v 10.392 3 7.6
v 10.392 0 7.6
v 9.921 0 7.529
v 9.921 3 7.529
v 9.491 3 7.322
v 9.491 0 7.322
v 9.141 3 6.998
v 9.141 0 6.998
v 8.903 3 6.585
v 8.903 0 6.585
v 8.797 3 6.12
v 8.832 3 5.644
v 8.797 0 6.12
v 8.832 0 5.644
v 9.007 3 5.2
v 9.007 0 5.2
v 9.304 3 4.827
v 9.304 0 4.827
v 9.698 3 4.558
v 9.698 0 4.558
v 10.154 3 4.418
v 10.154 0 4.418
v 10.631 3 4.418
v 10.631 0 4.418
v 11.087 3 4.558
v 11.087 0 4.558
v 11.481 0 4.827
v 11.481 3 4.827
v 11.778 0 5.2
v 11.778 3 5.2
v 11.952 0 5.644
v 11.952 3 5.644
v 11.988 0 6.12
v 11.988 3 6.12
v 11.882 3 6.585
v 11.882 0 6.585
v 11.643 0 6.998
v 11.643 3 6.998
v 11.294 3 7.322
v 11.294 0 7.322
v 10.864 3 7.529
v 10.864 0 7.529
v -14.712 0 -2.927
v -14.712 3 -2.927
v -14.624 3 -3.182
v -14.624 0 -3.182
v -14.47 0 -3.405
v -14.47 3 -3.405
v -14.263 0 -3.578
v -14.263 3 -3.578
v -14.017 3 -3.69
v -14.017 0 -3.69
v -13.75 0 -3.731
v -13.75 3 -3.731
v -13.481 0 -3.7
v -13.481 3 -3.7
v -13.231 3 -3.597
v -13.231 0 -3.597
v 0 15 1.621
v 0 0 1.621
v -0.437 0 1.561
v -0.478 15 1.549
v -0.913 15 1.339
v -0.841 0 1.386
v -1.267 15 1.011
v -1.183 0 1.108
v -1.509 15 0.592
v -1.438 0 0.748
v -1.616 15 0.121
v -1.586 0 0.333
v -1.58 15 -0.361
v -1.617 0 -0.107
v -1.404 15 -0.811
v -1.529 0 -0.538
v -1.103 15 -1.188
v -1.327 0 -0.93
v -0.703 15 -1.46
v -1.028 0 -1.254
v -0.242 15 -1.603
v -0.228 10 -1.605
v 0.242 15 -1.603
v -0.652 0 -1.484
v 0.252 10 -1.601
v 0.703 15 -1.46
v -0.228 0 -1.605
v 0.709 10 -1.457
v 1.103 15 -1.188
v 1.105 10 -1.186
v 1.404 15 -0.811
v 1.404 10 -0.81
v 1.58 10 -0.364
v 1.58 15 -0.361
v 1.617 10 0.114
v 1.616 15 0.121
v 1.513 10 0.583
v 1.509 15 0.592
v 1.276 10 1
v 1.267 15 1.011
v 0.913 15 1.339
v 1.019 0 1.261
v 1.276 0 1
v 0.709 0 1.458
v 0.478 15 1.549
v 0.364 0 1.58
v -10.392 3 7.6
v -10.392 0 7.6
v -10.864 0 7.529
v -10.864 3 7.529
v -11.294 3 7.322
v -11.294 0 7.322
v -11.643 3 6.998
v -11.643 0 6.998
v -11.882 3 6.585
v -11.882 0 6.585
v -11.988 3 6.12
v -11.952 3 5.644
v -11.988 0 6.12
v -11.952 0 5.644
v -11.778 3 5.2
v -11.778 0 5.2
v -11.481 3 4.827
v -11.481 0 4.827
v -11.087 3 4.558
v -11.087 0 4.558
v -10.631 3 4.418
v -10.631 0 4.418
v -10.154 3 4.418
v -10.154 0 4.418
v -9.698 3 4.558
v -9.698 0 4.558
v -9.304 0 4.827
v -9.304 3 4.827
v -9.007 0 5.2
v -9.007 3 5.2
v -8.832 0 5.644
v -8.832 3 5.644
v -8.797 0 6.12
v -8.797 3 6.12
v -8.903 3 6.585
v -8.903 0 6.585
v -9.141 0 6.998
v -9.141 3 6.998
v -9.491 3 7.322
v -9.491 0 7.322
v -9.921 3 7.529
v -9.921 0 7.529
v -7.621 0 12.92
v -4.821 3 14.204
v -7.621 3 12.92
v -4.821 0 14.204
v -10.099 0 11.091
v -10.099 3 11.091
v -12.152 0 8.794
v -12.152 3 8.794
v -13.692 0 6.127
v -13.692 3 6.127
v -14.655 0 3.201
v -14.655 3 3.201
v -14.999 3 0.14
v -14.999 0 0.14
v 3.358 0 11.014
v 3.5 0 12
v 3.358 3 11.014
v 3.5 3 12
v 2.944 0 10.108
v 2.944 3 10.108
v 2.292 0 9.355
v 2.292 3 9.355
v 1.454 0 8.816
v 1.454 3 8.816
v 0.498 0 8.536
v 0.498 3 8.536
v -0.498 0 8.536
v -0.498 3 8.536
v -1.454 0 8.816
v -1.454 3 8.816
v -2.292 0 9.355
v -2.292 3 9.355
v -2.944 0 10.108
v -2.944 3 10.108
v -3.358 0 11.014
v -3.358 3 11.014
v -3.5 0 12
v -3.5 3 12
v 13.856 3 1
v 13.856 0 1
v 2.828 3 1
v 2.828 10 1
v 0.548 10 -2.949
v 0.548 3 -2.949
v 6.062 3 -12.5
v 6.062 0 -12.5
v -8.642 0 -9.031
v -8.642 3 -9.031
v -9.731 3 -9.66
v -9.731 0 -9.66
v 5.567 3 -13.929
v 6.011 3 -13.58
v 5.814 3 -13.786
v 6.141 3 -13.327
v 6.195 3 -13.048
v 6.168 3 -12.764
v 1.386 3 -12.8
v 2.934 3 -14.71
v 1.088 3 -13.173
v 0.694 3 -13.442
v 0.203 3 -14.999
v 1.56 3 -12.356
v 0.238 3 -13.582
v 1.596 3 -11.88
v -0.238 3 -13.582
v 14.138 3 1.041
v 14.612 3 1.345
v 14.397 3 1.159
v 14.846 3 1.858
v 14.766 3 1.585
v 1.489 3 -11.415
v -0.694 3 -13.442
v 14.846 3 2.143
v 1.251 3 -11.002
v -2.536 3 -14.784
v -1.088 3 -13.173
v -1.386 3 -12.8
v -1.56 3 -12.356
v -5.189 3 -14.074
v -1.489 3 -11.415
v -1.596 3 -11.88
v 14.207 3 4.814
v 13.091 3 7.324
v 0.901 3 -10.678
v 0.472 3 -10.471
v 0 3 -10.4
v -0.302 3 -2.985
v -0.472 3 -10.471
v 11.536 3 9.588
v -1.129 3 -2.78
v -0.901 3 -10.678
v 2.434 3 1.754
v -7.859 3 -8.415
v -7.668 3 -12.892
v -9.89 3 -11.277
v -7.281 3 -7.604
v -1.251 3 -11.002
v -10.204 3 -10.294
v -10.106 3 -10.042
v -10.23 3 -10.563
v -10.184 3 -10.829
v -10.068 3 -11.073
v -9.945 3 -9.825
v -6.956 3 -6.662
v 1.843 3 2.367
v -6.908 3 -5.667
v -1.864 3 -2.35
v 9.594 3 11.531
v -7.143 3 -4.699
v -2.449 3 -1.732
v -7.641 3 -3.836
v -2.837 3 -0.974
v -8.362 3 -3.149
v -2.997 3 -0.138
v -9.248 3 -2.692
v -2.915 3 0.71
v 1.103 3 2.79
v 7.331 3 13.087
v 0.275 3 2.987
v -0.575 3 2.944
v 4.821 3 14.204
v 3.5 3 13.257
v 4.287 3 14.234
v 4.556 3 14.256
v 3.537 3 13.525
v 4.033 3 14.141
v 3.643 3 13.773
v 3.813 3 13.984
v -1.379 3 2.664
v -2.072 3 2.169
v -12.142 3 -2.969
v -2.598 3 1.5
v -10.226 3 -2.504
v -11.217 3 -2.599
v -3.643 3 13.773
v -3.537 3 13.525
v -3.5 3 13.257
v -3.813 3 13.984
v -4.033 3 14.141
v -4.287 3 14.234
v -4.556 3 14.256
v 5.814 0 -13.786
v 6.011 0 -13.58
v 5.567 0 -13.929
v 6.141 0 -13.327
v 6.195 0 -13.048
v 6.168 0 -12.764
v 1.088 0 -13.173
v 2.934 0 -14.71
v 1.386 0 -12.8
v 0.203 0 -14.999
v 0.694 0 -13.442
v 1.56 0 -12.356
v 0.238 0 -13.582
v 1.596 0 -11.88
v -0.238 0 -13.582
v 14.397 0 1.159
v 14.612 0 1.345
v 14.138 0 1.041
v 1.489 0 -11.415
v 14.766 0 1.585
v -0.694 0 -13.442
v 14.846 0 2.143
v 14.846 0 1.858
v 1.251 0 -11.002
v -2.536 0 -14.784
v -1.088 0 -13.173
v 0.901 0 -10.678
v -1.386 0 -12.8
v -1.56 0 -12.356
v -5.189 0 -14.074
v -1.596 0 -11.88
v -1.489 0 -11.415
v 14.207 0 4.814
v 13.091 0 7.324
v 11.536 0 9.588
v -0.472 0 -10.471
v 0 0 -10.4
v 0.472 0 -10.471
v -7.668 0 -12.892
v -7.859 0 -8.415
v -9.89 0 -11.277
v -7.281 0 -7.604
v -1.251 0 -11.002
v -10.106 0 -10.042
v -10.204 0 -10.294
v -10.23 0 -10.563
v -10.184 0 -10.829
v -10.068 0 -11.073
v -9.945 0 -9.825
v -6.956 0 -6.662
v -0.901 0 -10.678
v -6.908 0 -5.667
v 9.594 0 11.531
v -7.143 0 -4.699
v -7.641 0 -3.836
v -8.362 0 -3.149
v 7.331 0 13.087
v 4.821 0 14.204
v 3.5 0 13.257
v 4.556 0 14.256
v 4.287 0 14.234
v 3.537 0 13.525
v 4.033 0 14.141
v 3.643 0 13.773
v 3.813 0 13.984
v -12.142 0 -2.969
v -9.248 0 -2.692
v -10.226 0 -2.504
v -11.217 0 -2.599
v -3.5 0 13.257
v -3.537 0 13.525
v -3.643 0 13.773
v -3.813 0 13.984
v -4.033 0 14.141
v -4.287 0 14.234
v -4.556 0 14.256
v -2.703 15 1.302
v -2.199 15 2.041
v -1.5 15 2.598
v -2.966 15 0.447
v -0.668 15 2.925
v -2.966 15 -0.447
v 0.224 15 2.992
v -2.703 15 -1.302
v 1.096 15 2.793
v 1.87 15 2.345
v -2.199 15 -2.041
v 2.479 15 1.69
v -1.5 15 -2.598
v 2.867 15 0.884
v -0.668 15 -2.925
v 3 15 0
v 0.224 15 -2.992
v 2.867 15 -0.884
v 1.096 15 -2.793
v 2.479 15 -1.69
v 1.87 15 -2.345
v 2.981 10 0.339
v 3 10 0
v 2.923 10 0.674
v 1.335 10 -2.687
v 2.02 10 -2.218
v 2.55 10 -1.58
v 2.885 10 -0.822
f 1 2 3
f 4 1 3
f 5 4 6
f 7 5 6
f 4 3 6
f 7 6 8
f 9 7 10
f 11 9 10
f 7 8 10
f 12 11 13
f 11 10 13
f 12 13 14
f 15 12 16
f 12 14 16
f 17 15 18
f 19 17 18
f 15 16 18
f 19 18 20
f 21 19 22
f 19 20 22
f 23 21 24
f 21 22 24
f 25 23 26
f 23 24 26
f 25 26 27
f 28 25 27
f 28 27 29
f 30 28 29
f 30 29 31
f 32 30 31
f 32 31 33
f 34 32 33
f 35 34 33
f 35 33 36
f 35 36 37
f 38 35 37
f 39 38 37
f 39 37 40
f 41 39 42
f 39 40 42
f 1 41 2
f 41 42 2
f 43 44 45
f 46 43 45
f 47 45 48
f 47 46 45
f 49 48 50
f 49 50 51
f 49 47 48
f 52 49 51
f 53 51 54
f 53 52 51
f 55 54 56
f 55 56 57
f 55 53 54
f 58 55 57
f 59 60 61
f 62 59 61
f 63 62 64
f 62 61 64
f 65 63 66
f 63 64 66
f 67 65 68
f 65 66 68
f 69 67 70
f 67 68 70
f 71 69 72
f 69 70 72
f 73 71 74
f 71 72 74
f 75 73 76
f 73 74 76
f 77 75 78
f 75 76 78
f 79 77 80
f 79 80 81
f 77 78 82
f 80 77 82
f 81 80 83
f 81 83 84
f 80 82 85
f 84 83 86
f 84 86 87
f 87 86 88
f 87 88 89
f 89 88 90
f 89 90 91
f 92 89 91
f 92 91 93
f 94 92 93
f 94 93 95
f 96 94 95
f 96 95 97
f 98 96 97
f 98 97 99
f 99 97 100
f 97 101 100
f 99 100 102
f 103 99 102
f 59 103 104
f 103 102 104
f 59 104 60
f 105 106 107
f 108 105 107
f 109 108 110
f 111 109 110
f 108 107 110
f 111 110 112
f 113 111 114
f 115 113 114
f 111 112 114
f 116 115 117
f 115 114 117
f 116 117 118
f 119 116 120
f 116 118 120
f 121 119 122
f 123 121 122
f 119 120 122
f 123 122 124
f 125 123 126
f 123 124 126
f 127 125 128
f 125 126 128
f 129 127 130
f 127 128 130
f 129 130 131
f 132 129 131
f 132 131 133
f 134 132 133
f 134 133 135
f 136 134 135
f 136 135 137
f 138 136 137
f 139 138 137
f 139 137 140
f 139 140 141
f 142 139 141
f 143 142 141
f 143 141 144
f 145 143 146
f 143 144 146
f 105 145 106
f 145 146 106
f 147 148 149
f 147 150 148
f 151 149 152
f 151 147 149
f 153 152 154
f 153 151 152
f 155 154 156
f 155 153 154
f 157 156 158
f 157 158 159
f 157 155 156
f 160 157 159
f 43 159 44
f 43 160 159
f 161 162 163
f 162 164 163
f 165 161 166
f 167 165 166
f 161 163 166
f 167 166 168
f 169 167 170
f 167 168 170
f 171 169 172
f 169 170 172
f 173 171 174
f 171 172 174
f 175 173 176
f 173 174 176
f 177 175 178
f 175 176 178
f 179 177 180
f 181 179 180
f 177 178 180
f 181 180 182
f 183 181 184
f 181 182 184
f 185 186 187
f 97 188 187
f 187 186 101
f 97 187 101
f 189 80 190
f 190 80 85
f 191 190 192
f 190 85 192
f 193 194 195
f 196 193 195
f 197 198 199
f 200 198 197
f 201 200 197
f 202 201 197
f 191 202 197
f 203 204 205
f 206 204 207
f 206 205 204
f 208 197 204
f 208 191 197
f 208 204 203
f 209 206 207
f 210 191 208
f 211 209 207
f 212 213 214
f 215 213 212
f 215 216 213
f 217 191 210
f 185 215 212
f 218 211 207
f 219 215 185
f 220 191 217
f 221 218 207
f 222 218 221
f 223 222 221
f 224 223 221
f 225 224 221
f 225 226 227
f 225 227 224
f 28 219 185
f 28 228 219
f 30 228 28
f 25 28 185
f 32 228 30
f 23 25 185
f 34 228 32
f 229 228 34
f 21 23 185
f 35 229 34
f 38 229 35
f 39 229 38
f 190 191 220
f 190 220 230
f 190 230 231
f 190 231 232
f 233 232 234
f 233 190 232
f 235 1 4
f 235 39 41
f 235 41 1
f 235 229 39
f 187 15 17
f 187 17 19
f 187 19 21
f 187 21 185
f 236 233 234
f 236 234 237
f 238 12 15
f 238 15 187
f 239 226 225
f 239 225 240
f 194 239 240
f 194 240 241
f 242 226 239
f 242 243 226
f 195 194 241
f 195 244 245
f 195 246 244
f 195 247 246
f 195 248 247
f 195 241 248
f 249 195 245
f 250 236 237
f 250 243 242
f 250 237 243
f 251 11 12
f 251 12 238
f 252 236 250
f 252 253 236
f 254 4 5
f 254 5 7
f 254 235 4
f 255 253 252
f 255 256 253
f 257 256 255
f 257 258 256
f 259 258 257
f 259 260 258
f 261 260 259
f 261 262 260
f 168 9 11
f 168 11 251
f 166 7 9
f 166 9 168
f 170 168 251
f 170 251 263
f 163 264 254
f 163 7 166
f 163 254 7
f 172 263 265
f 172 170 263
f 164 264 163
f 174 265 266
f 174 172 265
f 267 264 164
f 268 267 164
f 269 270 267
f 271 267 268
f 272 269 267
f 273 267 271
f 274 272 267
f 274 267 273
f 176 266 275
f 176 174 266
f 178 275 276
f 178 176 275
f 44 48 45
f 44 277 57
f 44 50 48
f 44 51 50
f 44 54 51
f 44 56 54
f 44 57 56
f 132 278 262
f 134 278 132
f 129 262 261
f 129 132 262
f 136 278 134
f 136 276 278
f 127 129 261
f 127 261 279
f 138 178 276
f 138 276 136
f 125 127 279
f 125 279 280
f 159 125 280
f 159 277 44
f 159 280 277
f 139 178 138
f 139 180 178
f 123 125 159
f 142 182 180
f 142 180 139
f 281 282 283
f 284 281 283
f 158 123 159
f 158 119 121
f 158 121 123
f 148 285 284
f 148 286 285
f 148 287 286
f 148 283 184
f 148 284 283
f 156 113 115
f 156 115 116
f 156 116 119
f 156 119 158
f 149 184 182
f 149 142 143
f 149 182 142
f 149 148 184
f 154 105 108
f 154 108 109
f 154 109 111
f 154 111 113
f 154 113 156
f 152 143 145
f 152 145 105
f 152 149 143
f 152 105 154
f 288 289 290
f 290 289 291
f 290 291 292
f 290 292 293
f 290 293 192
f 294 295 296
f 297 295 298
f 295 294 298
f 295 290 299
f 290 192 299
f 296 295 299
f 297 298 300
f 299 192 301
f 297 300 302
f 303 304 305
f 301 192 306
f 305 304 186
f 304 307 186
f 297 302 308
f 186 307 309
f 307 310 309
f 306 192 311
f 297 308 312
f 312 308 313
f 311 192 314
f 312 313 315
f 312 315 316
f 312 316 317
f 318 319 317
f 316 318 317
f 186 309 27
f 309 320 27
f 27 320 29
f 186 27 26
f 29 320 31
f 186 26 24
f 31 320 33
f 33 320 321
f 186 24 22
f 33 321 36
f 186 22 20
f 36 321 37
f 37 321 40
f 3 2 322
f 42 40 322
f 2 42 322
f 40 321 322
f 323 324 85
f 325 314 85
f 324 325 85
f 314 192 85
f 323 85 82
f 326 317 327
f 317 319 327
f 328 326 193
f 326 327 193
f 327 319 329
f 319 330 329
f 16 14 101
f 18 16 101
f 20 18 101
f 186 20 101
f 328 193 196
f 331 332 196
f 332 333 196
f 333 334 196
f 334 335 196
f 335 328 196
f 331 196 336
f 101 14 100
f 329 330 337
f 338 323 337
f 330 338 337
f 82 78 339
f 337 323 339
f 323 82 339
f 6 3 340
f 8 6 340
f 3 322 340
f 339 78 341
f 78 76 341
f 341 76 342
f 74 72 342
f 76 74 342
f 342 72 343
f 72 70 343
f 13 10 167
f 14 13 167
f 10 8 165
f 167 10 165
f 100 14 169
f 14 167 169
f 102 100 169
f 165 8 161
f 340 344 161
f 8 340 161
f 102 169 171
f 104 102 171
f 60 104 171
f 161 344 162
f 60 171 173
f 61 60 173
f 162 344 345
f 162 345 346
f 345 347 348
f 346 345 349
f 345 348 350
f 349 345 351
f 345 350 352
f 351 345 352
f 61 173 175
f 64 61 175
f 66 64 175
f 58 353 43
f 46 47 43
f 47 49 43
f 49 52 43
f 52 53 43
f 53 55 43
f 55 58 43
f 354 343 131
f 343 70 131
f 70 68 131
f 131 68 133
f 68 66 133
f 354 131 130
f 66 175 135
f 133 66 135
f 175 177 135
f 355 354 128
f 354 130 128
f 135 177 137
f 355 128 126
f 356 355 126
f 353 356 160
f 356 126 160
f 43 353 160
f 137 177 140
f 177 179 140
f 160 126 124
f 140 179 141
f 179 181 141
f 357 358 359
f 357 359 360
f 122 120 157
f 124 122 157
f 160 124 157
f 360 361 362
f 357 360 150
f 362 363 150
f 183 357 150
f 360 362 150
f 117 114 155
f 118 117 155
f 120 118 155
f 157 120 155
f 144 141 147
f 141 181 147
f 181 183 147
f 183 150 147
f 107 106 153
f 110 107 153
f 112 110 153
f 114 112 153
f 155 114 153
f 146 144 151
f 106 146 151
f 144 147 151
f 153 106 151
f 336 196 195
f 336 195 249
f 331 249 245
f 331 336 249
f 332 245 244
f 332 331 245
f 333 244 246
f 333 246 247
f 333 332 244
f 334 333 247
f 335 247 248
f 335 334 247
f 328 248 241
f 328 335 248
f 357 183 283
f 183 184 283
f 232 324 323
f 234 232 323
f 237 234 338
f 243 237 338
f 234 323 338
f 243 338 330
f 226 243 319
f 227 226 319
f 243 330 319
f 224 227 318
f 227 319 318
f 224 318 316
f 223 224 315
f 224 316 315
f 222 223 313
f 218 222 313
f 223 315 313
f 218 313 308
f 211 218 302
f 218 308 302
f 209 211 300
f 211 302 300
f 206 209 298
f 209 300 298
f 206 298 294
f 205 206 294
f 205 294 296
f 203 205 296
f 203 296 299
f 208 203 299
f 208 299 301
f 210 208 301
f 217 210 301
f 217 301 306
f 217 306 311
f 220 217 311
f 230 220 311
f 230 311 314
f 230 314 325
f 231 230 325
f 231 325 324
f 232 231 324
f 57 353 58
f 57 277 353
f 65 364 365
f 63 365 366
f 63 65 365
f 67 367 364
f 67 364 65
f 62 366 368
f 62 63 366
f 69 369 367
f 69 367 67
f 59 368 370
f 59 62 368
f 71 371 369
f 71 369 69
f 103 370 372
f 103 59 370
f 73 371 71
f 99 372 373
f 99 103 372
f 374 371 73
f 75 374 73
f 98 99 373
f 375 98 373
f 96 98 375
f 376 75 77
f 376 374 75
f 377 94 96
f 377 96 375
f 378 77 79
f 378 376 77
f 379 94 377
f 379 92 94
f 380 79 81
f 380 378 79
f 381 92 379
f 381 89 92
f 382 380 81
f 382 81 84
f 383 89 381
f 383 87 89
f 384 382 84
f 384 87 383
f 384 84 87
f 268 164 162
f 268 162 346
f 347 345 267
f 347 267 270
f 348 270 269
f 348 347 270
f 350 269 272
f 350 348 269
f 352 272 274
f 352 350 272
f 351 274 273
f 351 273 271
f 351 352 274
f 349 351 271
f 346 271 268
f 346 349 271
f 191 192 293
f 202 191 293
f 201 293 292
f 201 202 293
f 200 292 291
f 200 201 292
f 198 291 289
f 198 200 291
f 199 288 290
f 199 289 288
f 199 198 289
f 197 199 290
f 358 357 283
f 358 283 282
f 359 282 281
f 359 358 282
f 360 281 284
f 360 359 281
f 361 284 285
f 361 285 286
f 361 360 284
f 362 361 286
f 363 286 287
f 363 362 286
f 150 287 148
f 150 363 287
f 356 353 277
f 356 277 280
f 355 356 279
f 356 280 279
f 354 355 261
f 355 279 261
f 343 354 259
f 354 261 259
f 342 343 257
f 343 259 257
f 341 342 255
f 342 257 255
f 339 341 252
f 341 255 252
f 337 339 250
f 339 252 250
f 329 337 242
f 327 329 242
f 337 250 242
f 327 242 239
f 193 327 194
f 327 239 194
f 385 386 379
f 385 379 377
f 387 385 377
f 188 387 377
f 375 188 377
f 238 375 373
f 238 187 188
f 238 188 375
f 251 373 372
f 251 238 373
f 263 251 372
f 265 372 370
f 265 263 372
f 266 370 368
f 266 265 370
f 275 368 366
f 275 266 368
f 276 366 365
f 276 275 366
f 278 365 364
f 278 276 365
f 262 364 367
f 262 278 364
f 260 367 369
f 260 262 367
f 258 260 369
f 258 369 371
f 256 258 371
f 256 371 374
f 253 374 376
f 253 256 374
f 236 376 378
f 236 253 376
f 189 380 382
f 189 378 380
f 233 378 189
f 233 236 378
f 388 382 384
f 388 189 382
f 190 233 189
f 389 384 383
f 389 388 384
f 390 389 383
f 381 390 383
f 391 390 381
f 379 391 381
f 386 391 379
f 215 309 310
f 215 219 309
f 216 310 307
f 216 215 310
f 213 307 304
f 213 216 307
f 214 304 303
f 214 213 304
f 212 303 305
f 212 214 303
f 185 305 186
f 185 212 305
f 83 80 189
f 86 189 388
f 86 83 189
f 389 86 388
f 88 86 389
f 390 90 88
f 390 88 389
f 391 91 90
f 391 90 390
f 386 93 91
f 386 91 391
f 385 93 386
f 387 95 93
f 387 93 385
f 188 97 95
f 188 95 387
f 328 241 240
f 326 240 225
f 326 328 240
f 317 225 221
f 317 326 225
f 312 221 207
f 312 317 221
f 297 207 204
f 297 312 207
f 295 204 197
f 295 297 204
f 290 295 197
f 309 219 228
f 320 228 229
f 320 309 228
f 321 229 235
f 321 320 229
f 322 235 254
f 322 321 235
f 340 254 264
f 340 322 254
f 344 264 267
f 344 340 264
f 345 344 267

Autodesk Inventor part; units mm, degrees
ref_plane "YZ Plane" through (0, 0, 0) normal (1, 0, 0) x (0, 1, 0)
ref_plane "XZ Plane" through (0, 0, 0) normal (0, 1, 0) x (-1, 0, 0)
ref_plane "XY Plane" through (0, 0, 0) normal (0, 0, 1) x (1, 0, 0)
sketch "Sketch1" plane through (0, 0, 0) normal (0, 1, 0) x (-1, 0, 0)
  circle A0 centre (0, 0) radius 15
  dimension "d0" = 30
extrude "Extrusion1" add sketch "Sketch1" along normal blind 3
sketch "Sketch2" plane through (0, 3, 0) normal (0, 1, 0) x (1, 0, 0)
  circle A0 centre (0, 0) radius 12 construction
  point P0 (0, 12)
  point P1 (-10.3923, -6)
  point P2 (10.3923, -6)
  dimension "d3" = 24
  dimension "d4" = 120
hole "Hole1" at (0, 3, -12) at (-10.3923, 3, 6) at (10.3923, 3, 6) direction (0, -1, 0) diameter 3.2 end through all
sketch "Sketch4" plane through (0, 3, 0) normal (0, 1, 0) x (1, 0, 0)
  circle A0 centre (0, -12) radius 3.5
  circle A1 centre (0, 0) radius 15 projected
  arc A2 (-3.5, -14.586) -> (3.5, -14.586) centre (0, 0) ccw
  line L0 (3.5, -12) -> (3.5, -14.586)
  line L1 (-3.5, -12) -> (-3.5, -14.586)
  dimension "d12" = 7
  dimension "d13" = 12
extrude "Extrusion2" cut sketch "Sketch4" against normal through all contours A0 A1 | L0 A1 A0 | A0 A1 L1 picked at (0.1406, -12.8318)
pattern_circular "Circular Pattern1" count 3 over 360 about axis through (0, 0, 0) along (0, 1, 0) of "Extrusion2"
sketch "Sketch6" plane through (0, 3, 0) normal (0, 1, 0) x (1, 0, 0)
  circle A0 centre (0, 0) radius 3
  dimension "d24" = 6
extrude "Extrusion4" add sketch "Sketch6" along normal blind 12
sketch "Sketch7" plane through (0, 0, 0) normal (0, -1, 0) x (1, 0, 0)
  line L0 (-1.5, 0) -> (63.9289, 0) construction
  line L1 (0, -1.5) -> (62.4289, -1.5)
  line L2 (62.4289, 1.5) -> (0, 1.5)
  arc A0 (0, 1.5) -> (0, -1.5) centre (0, 0) ccw
  arc A1 (62.4289, -1.5) -> (62.4289, 1.5) centre (62.4289, 0) ccw
  point P0 (31.2144, 0)
  dimension "d27" = 3
extrude "Extrusion5" [suppressed]
sketch "Sketch8" plane through (0, 15, 0) normal (0, 1, 0) x (1, 0, 0)
  point P0 (0, 0)
  point P1 (0, 0)
hole "Hole2" at (0, 15, 0) direction (0, -1, 0) diameter 3.242 end through all thread size "M4x0.7" class "6H" standard "ANSI Metric M Profile"
sketch "Sketch9" plane through (0, 0, 0) normal (0, -1, 0) x (1, 0, 0)
  arc A0 (12.1423, -2.9689) -> (8.6423, -9.0311) centre (10.3923, -6) ccw projected
  line L0 (0, 0) -> (10.3923, -6) construction
  line L1 (0, 0) -> (9.8835, -17.1187) construction
  line L2 (0, 0) -> (17.8778, 0) construction
  line L3 (19.4334, 1) -> (1.2758, 1)
  circle A1 centre (0, 0) radius 1.621 projected
  line L4 (-0.2281, -1.6049) -> (7.499, -14.9886)
  arc A2 (-10.8818, -10.3241) -> (10.8818, -10.3241) centre (0, 0) ccw projected
  arc A3 (14.3818, -4.2619) -> (3.5, 14.586) centre (0, 0) ccw projected
  arc A4 (6.6173, -13.4615) -> (14.9666, 1) centre (0, 0) ccw
  point P0 (10.8818, -10.3241)
  point P1 (14.3818, -4.2619)
  dimension "d37" = 30
  dimension "d38" = 30
  dimension "d39" = 1
  dimension "d40" = 1
extrude "Extrusion6" cut sketch "Sketch9" against normal blind 10 contours A3 A4 A2 L4 A1 L3
fillet "Fillet1" radius 1 6 edges at (14.9666, 1.5, 1) (6.6173, 1.5, -13.4615) (-3.5, 1.5, 14.586) (3.5, 1.5, 14.586) (-14.3818, 1.5, -4.2619) (-10.8818, 1.5, -10.3241)
equation "\"d38\" = d37"
equation "\"d40\" = d39"
properties part number "FrameSupport-Flange-Slit" material "Copper"
